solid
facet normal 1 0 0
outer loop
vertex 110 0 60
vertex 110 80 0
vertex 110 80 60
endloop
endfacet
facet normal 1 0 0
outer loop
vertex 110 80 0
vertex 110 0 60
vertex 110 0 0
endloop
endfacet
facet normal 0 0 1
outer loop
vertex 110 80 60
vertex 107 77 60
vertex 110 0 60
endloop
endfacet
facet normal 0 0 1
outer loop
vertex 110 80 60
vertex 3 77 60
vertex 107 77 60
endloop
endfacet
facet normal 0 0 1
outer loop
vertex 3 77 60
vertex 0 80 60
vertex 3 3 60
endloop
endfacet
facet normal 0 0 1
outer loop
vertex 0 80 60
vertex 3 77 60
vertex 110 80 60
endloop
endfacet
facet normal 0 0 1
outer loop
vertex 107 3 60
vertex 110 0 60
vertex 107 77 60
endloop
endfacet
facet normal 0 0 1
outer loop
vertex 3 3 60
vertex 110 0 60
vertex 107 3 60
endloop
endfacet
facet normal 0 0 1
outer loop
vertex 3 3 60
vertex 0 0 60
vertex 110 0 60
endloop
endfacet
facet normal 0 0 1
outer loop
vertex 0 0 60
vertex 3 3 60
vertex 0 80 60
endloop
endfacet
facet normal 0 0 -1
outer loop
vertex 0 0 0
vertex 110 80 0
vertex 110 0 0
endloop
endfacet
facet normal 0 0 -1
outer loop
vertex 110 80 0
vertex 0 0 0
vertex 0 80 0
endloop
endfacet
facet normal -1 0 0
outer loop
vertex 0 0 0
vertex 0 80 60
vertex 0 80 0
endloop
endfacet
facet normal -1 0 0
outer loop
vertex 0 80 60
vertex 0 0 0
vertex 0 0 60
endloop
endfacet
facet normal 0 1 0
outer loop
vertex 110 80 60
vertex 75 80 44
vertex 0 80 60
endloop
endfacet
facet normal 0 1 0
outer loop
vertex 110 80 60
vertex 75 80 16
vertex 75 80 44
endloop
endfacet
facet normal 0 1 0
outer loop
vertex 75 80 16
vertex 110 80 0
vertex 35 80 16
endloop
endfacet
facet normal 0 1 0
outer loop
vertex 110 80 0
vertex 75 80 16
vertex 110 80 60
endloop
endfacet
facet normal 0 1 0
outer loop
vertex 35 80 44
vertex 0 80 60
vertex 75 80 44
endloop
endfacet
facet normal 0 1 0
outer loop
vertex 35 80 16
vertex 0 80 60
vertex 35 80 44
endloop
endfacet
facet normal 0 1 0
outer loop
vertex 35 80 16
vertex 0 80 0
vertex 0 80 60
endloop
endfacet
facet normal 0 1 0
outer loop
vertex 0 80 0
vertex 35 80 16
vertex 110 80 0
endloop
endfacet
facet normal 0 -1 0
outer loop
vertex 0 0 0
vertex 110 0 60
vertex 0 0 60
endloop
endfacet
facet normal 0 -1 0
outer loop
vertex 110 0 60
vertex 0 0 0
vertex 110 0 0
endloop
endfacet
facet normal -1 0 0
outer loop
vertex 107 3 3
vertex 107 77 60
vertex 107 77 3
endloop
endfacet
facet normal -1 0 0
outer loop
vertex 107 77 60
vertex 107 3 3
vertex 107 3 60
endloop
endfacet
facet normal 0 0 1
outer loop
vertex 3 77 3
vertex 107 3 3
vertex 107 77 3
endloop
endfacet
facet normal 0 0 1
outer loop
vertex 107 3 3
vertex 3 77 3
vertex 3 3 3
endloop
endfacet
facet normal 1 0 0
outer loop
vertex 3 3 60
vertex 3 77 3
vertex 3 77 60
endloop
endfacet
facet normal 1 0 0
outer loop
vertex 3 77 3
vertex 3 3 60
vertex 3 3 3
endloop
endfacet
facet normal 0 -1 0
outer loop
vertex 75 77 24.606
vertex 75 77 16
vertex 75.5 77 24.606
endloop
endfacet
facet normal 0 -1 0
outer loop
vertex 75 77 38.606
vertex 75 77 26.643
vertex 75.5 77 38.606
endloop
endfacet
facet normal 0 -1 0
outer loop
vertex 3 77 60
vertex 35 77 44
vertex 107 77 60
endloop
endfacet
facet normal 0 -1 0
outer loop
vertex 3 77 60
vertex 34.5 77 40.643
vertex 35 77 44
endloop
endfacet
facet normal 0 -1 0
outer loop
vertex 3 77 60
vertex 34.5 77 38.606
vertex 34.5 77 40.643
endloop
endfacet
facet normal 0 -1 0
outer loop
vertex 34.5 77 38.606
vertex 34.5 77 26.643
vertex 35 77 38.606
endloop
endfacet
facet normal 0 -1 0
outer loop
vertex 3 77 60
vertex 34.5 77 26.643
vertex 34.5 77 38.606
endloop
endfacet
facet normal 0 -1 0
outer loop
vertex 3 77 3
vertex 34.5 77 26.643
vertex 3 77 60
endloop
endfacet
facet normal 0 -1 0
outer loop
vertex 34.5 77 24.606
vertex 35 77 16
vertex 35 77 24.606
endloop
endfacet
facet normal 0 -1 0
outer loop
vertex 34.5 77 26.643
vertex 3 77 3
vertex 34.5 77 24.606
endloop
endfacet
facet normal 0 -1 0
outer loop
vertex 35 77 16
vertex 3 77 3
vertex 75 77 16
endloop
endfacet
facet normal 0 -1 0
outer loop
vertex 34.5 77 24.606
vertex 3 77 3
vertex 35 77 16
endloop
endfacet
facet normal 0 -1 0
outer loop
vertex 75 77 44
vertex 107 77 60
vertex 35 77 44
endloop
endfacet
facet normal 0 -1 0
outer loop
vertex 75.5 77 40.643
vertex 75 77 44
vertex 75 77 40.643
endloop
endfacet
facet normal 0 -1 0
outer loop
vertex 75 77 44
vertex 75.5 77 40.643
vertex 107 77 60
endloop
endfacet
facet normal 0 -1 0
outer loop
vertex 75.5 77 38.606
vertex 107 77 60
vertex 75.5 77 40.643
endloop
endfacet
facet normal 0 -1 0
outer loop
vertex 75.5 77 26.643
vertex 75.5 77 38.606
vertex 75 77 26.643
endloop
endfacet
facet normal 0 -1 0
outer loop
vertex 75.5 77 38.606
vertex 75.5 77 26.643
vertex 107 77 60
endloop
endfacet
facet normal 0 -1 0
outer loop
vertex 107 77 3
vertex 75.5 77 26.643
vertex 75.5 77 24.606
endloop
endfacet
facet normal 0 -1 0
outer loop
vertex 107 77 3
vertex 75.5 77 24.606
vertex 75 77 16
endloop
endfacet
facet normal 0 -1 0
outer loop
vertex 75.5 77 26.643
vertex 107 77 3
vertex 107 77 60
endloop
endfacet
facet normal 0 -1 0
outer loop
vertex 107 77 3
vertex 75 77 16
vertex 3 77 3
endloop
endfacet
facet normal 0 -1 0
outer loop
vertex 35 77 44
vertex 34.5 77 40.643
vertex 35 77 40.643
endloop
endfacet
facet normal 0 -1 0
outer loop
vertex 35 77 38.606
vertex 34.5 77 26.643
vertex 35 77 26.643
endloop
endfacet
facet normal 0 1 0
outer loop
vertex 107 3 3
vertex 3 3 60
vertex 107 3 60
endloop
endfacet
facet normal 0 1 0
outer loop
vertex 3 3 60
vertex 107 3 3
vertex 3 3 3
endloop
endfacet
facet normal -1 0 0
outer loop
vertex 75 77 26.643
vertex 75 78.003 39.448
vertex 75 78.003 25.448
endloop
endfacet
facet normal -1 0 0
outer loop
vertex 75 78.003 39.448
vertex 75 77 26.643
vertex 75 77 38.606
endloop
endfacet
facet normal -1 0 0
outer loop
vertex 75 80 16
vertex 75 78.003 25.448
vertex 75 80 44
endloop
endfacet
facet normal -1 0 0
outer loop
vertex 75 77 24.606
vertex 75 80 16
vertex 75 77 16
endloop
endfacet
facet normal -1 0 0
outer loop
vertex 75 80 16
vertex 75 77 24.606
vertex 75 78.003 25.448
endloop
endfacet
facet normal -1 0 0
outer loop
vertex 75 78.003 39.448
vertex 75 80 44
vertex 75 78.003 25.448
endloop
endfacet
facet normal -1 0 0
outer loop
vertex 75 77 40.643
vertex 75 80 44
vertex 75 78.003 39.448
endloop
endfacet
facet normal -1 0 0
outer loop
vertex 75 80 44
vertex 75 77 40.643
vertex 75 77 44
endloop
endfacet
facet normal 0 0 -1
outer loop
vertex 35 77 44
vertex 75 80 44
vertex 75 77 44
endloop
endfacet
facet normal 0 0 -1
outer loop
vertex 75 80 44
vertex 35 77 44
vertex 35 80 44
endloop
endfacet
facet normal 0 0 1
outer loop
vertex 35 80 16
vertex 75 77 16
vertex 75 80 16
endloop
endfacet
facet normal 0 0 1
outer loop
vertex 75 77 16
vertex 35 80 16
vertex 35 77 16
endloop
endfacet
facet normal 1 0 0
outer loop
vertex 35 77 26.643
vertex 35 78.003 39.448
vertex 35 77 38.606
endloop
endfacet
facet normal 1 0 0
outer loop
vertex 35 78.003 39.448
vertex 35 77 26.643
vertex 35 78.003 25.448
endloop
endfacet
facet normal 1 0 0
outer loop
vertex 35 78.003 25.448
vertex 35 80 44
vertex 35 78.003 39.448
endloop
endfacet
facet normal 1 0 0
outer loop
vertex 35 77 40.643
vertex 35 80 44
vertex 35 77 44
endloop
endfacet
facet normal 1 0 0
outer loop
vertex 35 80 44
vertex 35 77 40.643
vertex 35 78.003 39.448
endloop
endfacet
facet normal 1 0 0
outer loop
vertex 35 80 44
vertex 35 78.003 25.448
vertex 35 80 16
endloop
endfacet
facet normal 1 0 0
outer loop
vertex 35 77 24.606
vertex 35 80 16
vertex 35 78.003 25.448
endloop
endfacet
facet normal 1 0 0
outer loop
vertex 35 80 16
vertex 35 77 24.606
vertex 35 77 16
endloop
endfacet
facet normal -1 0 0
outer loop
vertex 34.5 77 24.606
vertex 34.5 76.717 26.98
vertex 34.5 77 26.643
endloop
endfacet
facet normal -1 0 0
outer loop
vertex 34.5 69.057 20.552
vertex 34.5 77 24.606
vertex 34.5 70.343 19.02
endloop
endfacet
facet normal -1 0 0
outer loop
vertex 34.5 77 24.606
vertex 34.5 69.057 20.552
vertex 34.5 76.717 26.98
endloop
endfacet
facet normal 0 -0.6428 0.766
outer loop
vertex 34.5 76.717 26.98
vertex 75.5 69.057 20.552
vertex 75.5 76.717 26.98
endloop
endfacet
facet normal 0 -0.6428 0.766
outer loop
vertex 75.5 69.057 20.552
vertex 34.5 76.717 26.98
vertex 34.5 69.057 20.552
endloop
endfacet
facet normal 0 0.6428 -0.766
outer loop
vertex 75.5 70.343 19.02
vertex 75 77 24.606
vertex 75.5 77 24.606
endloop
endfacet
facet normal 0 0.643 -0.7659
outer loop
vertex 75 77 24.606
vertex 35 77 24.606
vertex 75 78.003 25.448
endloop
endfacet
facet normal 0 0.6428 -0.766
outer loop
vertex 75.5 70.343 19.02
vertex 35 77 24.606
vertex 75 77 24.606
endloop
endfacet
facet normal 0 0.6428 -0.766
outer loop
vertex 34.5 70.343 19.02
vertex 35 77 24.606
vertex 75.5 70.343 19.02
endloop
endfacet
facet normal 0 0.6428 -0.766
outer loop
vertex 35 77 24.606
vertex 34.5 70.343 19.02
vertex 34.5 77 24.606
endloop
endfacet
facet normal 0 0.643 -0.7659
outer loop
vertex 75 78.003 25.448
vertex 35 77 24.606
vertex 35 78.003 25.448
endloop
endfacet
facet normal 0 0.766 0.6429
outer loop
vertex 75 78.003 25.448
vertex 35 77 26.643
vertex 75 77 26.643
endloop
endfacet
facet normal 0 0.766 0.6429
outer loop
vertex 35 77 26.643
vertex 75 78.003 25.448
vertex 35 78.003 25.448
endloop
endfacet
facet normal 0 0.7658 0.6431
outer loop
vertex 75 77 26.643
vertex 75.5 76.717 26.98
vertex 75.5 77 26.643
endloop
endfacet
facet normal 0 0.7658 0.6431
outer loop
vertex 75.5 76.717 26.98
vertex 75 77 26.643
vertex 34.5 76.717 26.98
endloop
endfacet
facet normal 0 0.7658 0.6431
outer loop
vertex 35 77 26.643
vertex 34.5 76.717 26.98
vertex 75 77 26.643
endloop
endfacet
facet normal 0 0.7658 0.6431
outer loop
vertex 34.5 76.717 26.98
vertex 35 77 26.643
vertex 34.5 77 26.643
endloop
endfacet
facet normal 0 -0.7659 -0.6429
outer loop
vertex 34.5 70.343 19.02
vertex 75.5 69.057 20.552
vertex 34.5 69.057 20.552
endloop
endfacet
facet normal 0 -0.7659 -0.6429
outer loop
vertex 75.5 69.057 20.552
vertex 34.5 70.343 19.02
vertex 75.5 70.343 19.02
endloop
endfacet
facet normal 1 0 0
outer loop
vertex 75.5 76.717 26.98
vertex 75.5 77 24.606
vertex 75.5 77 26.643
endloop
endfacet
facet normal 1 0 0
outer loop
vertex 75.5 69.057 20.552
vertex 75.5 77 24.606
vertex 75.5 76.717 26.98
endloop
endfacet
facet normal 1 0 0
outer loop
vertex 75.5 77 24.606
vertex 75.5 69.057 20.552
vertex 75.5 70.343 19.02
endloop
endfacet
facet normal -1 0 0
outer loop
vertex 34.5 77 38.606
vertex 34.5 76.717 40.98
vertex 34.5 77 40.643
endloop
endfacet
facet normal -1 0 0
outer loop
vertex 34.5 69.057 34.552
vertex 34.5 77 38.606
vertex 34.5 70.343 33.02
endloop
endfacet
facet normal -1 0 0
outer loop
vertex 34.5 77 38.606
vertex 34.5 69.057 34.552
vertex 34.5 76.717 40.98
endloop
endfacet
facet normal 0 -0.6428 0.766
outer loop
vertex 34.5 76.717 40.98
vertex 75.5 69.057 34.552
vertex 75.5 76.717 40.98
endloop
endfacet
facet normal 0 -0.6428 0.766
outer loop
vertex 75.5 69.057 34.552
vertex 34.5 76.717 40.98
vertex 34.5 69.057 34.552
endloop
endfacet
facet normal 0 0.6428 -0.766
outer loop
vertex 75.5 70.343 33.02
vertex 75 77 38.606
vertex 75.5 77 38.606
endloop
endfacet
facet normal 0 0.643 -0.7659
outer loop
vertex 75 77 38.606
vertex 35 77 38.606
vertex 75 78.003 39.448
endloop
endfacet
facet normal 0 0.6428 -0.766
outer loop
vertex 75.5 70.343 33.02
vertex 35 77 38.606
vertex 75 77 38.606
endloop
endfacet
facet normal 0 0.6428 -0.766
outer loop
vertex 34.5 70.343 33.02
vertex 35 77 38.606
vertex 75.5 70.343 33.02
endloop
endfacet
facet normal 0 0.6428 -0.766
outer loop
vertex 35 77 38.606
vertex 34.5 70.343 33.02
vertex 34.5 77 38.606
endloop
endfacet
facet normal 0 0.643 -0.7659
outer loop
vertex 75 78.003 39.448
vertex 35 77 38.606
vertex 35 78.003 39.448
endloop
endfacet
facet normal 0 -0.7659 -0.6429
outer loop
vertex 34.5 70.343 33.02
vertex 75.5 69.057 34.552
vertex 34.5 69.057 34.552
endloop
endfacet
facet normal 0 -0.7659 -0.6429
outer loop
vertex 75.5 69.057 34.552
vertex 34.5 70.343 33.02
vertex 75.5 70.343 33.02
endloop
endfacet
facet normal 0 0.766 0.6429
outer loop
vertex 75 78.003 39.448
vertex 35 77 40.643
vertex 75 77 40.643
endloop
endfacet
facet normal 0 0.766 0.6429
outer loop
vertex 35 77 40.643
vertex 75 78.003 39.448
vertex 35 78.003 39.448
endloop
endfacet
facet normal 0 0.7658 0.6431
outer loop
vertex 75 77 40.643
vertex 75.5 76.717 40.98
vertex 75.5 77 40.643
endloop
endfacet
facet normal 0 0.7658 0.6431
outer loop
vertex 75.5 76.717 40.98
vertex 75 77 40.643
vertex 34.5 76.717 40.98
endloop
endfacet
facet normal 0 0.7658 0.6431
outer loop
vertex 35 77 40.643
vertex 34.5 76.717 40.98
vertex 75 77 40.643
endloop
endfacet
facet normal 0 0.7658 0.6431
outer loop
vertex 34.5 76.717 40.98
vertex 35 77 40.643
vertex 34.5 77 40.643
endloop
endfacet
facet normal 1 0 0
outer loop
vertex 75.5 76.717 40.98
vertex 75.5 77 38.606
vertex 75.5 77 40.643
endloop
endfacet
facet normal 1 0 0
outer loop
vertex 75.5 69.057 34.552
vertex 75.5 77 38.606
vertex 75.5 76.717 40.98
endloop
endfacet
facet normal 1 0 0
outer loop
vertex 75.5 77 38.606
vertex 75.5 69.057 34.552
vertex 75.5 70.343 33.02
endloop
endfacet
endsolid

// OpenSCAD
$fn = 32;

// ----------------------------------------------------------------------
// Vent box: louvers enclosure
// ----------------------------------------------------------------------

// --- parameters (mm) ---
box_l = 110;              // box length, X
box_w = 80;               // box width, Y
box_h = 60;               // box height, Z
wall_t = 3;               // shell wall thickness
win_l = 40;               // vent window width, X
win_h = 28;               // vent window height, Z
slat_t = 2;               // louver slat thickness
slat_d = 10;              // louver slat depth
slat_a = 40;              // louver slat angle, degrees
slat_pitch = 14;          // louver pitch
slat_yc = 73.53;          // slat centreline Y

win_z0 = (box_h - win_h) / 2;  // window lower edge Z
n_slats = 2;  // louver count
slat_z0 = win_z0 + (win_h - (n_slats - 1) * slat_pitch) / 2;

difference() {
  union() {
    difference() {
      cube([box_l, box_w, box_h]);
  translate([wall_t, wall_t, wall_t])
    cube([box_l - 2 * wall_t, box_w - 2 * wall_t, box_h]);
  translate([(box_l - win_l) / 2, box_w - wall_t - 1, win_z0])
    cube([win_l, wall_t + 2, win_h]);
    }
    for (i = [0 : n_slats - 1])
      translate([box_l / 2, slat_yc, slat_z0 + i * slat_pitch])
        rotate([slat_a, 0, 0])
          cube([win_l + 1, slat_d, slat_t], center = true);
  }
}
